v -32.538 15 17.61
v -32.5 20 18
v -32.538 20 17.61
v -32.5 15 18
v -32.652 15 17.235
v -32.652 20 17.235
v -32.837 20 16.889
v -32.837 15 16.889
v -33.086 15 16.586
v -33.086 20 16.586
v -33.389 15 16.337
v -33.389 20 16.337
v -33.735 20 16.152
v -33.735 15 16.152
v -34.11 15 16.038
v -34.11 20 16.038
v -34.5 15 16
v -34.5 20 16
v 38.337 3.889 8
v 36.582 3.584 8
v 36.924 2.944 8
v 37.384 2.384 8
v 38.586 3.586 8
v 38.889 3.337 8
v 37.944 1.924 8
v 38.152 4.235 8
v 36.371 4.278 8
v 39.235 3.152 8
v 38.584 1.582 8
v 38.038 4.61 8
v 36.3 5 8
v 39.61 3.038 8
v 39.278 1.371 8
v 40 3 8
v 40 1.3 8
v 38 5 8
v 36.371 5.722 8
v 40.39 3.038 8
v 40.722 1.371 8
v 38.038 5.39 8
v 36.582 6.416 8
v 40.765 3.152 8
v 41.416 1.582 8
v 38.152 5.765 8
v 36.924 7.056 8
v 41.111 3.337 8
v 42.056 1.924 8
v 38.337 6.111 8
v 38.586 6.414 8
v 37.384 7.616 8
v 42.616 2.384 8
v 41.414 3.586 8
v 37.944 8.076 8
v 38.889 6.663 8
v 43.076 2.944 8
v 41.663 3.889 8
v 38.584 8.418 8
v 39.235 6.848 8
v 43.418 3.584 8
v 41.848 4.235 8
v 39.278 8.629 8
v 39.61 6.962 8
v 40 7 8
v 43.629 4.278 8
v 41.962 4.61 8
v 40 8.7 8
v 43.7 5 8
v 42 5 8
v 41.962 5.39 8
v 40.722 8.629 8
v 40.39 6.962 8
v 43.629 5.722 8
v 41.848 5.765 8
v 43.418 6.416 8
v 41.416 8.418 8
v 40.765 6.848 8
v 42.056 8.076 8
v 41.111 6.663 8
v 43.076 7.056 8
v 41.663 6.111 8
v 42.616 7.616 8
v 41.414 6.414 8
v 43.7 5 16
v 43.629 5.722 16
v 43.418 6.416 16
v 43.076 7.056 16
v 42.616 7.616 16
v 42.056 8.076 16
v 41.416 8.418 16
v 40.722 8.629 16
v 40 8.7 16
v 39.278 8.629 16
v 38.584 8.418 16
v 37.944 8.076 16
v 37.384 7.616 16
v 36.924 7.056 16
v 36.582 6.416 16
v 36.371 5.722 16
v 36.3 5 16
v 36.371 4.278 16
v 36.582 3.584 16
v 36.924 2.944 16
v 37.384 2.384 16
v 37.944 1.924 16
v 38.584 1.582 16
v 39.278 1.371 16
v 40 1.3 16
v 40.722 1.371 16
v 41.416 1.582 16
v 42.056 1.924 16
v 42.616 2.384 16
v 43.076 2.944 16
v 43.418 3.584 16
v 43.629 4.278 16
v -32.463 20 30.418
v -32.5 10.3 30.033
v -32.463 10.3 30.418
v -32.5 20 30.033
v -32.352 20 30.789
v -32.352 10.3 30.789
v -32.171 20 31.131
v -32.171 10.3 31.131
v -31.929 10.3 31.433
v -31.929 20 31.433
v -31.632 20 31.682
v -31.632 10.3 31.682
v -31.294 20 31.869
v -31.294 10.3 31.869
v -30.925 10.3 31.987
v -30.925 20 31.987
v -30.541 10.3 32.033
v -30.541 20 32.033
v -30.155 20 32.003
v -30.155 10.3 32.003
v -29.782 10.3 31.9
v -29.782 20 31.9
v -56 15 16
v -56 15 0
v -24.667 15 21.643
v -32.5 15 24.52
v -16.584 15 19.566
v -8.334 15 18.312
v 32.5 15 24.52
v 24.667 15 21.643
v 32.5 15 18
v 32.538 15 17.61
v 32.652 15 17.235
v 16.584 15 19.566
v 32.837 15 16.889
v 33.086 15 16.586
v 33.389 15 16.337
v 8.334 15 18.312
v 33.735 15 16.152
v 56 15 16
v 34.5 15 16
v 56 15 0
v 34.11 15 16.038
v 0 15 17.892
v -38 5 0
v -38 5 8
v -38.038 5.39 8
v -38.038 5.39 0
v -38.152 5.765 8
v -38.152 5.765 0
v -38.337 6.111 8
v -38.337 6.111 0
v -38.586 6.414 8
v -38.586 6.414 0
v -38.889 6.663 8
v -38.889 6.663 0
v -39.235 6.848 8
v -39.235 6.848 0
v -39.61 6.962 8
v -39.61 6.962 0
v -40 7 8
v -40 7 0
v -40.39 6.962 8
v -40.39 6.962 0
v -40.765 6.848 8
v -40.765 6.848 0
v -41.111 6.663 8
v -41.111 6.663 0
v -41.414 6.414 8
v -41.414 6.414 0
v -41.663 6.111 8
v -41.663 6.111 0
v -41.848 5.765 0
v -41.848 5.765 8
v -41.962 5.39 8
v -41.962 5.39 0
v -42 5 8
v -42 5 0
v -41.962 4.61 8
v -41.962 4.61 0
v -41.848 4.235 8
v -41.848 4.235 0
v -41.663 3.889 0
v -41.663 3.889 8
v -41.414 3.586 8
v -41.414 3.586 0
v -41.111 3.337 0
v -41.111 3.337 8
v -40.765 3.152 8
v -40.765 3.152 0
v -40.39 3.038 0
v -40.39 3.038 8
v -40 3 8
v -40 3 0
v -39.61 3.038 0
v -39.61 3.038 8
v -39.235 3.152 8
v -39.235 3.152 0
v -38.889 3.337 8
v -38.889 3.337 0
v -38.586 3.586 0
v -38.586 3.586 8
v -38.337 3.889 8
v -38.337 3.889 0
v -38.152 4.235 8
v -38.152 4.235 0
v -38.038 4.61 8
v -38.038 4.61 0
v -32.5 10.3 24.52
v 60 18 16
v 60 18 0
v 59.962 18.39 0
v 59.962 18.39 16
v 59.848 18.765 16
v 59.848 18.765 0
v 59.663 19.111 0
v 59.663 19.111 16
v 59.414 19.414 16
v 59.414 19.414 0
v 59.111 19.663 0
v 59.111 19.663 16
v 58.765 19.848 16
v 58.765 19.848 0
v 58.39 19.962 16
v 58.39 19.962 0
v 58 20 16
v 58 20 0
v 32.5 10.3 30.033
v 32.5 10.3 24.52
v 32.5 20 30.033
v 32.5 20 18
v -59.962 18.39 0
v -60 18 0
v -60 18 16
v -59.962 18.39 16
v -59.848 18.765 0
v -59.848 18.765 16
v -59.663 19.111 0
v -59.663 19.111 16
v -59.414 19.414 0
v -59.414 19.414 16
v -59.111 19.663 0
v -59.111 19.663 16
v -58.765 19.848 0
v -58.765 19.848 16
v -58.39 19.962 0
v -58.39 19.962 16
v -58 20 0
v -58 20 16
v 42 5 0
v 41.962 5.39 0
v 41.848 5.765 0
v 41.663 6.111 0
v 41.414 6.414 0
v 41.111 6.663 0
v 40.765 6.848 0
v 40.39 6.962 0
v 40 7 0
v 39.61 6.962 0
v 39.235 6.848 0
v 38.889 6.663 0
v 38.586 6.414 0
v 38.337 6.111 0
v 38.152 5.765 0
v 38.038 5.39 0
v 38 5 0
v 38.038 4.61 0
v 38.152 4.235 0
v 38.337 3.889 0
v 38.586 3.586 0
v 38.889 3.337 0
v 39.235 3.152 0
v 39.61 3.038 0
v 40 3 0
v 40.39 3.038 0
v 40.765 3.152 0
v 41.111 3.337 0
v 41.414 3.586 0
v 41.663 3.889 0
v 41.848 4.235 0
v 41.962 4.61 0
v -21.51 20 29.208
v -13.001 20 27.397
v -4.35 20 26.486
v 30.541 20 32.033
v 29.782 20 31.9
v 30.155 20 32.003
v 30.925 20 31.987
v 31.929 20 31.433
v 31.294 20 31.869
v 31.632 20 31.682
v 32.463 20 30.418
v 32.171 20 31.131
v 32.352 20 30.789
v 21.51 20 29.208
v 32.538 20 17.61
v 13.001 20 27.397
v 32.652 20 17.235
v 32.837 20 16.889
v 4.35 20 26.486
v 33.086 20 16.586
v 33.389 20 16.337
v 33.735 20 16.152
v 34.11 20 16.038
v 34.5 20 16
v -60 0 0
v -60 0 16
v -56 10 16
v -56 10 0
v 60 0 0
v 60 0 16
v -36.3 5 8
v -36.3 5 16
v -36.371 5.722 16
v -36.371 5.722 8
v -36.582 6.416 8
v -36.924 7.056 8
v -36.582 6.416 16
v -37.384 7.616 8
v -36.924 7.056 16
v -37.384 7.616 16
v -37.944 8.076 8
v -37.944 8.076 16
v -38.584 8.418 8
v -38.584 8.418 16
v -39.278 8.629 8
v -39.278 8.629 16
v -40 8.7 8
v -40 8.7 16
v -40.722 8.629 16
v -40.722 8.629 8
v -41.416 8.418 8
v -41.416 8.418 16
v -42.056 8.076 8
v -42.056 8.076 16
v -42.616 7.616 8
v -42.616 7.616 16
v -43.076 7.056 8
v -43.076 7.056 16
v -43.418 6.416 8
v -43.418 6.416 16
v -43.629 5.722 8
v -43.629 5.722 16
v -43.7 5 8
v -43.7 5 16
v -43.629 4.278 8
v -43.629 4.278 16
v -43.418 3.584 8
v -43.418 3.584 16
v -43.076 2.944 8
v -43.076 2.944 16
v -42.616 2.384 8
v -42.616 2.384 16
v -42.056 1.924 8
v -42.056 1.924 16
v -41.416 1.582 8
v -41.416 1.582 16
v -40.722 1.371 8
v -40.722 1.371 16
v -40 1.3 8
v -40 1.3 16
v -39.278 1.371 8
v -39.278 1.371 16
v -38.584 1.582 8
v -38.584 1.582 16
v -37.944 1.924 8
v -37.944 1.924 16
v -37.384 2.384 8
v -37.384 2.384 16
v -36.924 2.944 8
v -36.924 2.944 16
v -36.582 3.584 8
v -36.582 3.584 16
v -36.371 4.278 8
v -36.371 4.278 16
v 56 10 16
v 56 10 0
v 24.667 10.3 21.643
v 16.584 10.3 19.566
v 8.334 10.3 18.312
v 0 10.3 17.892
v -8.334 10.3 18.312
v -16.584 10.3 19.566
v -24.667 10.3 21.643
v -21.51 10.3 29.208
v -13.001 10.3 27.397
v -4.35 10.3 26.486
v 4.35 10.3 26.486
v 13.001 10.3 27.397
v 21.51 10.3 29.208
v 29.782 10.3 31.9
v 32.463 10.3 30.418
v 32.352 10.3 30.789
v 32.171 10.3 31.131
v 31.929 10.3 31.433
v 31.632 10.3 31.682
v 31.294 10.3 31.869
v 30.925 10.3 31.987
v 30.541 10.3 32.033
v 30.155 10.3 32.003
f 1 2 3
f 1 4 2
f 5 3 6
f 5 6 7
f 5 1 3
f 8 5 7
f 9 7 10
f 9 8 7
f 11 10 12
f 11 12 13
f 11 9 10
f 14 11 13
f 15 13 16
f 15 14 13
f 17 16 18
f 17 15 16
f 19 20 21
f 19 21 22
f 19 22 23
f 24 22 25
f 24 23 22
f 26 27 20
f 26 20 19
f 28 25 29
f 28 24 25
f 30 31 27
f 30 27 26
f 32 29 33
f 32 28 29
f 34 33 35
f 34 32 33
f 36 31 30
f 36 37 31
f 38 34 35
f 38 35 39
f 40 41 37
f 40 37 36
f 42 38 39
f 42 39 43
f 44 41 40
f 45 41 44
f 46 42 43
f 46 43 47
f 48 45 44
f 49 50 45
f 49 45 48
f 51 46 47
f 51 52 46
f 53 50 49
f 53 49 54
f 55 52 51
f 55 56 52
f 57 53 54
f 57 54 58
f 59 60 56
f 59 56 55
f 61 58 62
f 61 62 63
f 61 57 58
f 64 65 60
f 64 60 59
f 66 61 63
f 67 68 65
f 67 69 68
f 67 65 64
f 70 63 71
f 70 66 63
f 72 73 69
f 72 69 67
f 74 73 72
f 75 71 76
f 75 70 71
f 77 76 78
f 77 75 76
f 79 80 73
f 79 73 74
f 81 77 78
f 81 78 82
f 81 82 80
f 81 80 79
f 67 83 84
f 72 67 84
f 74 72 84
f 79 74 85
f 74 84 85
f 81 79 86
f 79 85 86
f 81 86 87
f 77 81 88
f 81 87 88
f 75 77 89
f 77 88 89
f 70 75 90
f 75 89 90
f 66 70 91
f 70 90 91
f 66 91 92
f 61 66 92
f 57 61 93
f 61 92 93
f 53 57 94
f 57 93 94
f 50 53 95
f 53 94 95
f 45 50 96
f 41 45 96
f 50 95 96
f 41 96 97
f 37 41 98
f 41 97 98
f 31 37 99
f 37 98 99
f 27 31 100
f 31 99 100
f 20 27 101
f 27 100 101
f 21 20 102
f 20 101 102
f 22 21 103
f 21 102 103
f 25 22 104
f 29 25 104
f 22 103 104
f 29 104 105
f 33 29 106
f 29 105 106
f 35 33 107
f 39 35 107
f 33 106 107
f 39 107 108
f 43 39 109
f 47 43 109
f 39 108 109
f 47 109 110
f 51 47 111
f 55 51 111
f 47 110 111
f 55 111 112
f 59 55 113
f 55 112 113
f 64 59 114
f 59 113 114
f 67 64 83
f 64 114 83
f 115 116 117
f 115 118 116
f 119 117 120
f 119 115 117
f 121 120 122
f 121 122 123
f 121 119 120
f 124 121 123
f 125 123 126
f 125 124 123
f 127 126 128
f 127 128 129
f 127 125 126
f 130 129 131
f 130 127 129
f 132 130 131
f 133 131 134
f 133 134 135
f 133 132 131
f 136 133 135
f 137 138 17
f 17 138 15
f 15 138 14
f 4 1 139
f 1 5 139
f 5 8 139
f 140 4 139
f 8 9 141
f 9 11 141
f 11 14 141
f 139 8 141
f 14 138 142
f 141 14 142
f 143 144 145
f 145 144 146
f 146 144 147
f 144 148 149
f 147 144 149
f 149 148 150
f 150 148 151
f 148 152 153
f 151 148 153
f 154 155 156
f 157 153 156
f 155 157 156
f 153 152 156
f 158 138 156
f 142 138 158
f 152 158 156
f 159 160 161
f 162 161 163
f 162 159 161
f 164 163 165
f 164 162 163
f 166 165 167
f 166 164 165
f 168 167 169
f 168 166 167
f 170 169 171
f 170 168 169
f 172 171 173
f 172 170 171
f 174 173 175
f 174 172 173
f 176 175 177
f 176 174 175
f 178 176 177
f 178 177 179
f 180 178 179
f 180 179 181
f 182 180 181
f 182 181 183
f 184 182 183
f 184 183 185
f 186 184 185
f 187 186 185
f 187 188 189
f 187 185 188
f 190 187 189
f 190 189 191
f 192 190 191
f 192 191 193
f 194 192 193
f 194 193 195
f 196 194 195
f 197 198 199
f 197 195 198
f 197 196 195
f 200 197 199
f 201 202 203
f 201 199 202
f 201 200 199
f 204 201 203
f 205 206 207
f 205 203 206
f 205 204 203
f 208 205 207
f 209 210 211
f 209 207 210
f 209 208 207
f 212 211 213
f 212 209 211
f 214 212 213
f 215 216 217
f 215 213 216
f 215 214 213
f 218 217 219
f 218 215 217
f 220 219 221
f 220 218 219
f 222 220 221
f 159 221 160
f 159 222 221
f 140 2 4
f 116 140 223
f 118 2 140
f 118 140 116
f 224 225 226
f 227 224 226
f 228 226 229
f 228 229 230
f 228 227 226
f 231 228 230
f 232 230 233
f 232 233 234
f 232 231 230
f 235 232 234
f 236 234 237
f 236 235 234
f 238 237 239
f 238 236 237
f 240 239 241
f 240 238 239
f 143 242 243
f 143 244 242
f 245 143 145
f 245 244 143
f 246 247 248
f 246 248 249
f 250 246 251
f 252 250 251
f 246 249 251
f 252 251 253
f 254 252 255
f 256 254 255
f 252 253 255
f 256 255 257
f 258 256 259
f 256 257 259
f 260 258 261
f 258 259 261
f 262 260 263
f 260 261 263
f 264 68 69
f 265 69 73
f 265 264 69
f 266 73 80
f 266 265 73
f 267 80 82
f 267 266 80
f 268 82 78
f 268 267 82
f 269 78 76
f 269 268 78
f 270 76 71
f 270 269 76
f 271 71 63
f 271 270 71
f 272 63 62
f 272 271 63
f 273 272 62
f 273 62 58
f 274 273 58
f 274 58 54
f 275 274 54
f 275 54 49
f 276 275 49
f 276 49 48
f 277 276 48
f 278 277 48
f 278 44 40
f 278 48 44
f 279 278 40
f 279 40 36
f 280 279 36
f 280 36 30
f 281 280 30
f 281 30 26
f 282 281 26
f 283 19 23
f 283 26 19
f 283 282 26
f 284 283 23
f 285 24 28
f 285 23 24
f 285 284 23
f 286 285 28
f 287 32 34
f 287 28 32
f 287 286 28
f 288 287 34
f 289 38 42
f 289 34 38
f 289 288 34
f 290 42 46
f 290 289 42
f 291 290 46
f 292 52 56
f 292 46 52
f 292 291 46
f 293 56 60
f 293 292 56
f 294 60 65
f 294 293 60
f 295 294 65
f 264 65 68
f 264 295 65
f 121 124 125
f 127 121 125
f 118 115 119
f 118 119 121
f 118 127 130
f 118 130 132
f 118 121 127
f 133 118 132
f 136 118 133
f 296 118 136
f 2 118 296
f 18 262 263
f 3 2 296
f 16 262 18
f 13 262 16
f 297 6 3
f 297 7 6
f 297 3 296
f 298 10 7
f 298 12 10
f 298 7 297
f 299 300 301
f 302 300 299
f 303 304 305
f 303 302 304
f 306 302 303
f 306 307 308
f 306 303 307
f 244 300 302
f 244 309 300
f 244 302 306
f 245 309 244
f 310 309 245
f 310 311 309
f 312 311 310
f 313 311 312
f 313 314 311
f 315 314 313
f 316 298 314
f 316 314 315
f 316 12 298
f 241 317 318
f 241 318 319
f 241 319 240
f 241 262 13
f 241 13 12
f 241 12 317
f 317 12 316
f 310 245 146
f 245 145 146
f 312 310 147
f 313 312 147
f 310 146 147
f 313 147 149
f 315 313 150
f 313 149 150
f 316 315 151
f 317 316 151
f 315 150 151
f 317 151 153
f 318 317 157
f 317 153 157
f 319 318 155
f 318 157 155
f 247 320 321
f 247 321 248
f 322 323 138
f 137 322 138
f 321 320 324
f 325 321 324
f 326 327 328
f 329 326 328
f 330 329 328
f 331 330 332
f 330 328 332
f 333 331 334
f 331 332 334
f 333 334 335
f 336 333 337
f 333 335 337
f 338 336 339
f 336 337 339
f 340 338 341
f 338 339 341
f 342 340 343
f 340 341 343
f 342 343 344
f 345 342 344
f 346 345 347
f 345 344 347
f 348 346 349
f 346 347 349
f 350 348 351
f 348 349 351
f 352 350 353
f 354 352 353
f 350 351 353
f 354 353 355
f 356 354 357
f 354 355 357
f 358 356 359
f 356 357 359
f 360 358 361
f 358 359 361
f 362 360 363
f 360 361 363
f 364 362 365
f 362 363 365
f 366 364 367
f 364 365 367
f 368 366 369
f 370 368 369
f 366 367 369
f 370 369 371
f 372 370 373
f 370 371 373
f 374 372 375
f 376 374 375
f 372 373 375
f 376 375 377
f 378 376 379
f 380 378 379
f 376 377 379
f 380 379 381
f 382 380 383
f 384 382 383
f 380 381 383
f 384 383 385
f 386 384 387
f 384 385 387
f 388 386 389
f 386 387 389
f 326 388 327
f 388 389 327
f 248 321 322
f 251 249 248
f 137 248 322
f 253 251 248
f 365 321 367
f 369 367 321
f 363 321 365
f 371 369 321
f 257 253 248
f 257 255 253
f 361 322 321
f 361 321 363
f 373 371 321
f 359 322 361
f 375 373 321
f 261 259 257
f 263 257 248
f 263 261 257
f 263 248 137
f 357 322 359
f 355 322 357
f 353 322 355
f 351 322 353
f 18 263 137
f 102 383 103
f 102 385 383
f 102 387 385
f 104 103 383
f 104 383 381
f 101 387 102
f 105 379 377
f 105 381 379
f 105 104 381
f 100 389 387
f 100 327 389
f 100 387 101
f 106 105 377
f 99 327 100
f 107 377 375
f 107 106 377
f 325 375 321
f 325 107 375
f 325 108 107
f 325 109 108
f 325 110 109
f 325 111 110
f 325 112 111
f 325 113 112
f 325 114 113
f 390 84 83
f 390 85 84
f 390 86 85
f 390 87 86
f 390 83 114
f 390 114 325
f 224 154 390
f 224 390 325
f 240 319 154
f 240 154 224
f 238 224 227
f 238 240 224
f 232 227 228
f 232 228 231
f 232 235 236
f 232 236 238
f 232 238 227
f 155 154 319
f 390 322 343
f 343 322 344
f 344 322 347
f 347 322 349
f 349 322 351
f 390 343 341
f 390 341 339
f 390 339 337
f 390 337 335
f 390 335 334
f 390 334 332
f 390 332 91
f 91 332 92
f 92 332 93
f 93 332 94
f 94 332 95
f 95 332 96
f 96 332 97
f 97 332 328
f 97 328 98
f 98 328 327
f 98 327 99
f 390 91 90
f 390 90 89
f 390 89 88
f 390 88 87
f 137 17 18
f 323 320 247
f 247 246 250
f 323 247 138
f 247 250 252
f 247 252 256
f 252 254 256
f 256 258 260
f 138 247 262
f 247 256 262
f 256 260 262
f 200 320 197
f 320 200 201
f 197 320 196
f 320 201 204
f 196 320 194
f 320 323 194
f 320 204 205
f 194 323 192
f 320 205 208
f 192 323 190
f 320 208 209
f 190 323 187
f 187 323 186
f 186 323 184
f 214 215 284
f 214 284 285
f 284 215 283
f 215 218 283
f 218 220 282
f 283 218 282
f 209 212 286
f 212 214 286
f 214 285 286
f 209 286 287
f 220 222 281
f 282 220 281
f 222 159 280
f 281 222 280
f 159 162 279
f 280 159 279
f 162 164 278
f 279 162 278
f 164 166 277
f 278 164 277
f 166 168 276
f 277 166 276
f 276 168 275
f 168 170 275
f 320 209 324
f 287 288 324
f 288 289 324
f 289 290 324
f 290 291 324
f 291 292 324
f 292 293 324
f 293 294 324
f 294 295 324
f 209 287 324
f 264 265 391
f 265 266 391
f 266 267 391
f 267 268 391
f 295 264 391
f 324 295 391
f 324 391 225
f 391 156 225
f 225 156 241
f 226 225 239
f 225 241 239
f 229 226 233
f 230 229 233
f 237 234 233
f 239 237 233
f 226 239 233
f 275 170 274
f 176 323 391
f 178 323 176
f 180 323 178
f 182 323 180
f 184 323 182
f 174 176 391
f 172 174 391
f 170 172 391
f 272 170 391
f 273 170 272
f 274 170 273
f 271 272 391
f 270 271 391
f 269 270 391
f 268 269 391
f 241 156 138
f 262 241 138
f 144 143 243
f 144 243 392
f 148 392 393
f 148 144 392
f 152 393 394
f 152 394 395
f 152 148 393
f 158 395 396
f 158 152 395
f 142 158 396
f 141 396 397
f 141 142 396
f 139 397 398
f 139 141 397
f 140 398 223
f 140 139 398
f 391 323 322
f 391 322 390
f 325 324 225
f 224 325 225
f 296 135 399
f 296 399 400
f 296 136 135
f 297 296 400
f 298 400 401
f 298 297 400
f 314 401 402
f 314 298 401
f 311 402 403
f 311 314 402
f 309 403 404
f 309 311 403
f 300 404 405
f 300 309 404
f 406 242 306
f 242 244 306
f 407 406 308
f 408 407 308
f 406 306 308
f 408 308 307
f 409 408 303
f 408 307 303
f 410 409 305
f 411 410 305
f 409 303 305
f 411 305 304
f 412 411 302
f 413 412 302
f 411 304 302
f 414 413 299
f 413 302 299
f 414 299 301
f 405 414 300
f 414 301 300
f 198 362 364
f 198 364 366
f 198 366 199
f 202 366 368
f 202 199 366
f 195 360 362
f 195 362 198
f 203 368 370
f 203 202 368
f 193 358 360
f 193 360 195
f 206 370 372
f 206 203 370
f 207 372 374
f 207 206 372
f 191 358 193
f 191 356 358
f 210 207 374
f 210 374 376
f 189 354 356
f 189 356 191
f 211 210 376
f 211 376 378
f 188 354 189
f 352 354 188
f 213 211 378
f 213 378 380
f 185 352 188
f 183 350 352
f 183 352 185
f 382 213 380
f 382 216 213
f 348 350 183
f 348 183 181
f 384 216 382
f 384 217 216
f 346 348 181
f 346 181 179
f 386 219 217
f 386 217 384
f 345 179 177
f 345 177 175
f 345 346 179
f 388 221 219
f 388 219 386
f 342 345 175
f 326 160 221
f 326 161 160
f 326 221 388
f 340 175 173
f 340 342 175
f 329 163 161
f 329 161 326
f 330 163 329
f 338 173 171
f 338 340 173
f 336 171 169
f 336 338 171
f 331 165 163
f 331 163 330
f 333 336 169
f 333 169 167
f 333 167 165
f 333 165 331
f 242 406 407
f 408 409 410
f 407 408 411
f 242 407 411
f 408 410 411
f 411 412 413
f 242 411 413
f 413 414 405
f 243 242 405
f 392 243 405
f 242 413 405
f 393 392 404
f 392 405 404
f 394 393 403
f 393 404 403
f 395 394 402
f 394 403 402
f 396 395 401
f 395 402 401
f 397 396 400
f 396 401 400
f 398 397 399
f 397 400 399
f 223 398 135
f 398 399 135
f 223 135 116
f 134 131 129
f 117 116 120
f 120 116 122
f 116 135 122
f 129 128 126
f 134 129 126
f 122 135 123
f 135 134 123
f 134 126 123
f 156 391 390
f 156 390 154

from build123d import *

# Parameters (mm, degrees)
SKETCH1_W           = 120
SKETCH1_H           = 20
SKETCH1_R           = 2
SKETCH1_W_2         = 112
SKETCH1_H_2         = 5
BOSS_EXTRUDE1_DEPTH = 16
SKETCH2_R           = 3.7
CUT_EXTRUDE1_DEPTH  = 8
BOSS_EXTRUDE2_DEPTH = 5
BOSS_EXTRUDE3_DEPTH = 4.7
FILLET1_R           = 2


with BuildPart() as part:
    # Sketch1 → Boss-Extrude1 (new body)
    with BuildSketch(Plane.XY):
        with Locations((0, 10)):
            Rectangle(SKETCH1_W, SKETCH1_H)
        with Locations((-40, 5)):
            Circle(SKETCH1_R, mode=Mode.SUBTRACT)
        with Locations((40, 5)):
            Circle(SKETCH1_R, mode=Mode.SUBTRACT)
        with Locations((0, 12.5)):
            Rectangle(SKETCH1_W_2, SKETCH1_H_2, mode=Mode.SUBTRACT)
    extrude(amount=BOSS_EXTRUDE1_DEPTH)

    # Sketch2 → Cut-Extrude1 (cut)
    with BuildSketch(Plane.XY.offset(16)):
        with Locations((-40, 5)):
            Circle(SKETCH2_R)
        with Locations((40, 5)):
            Circle(SKETCH2_R)
    extrude(amount=-CUT_EXTRUDE1_DEPTH, mode=Mode.SUBTRACT)

    # Sketch3 → Boss-Extrude2 (add)
    with BuildSketch(Plane(origin=(0, 20, 0), x_dir=(1, 0, 0), z_dir=(0, 1, 0))):
        with BuildLine():
            Line((-32.5, -33), (-32.5, -16))
            Line((-32.5, -16), (32.5, -16))
            Line((32.5, -16), (32.5, -33))
            ThreePointArc((32.5, -33), (0, -26.372442674), (-32.5, -33))
        make_face()
    extrude(amount=-BOSS_EXTRUDE2_DEPTH)

    # Sketch4 → Boss-Extrude3 (add)
    with BuildSketch(Plane.XZ.offset(-15)):
        with BuildLine():
            Line((-32.5, 24.52), (-32.5, 33))
            ThreePointArc((-32.5, 33), (0, 26.372442674), (32.5, 33))
            Line((32.5, 33), (32.5, 24.52))
            ThreePointArc((32.5, 24.52), (0, 17.892442674), (-32.5, 24.52))
        make_face()
    extrude(amount=BOSS_EXTRUDE3_DEPTH)

    # Fillet1
    fillet1_edges = [part.edges().sort_by_distance(p)[0] for p in [
        (32.5, 17.5, 16),
        (-32.5, 17.5, 16),
        (-32.5, 15.15, 33),
        (32.5, 15.15, 33),
        (-60, 20, 8),
        (60, 20, 8),
    ]]
    fillet(fillet1_edges, radius=FILLET1_R)


solid = part.part
